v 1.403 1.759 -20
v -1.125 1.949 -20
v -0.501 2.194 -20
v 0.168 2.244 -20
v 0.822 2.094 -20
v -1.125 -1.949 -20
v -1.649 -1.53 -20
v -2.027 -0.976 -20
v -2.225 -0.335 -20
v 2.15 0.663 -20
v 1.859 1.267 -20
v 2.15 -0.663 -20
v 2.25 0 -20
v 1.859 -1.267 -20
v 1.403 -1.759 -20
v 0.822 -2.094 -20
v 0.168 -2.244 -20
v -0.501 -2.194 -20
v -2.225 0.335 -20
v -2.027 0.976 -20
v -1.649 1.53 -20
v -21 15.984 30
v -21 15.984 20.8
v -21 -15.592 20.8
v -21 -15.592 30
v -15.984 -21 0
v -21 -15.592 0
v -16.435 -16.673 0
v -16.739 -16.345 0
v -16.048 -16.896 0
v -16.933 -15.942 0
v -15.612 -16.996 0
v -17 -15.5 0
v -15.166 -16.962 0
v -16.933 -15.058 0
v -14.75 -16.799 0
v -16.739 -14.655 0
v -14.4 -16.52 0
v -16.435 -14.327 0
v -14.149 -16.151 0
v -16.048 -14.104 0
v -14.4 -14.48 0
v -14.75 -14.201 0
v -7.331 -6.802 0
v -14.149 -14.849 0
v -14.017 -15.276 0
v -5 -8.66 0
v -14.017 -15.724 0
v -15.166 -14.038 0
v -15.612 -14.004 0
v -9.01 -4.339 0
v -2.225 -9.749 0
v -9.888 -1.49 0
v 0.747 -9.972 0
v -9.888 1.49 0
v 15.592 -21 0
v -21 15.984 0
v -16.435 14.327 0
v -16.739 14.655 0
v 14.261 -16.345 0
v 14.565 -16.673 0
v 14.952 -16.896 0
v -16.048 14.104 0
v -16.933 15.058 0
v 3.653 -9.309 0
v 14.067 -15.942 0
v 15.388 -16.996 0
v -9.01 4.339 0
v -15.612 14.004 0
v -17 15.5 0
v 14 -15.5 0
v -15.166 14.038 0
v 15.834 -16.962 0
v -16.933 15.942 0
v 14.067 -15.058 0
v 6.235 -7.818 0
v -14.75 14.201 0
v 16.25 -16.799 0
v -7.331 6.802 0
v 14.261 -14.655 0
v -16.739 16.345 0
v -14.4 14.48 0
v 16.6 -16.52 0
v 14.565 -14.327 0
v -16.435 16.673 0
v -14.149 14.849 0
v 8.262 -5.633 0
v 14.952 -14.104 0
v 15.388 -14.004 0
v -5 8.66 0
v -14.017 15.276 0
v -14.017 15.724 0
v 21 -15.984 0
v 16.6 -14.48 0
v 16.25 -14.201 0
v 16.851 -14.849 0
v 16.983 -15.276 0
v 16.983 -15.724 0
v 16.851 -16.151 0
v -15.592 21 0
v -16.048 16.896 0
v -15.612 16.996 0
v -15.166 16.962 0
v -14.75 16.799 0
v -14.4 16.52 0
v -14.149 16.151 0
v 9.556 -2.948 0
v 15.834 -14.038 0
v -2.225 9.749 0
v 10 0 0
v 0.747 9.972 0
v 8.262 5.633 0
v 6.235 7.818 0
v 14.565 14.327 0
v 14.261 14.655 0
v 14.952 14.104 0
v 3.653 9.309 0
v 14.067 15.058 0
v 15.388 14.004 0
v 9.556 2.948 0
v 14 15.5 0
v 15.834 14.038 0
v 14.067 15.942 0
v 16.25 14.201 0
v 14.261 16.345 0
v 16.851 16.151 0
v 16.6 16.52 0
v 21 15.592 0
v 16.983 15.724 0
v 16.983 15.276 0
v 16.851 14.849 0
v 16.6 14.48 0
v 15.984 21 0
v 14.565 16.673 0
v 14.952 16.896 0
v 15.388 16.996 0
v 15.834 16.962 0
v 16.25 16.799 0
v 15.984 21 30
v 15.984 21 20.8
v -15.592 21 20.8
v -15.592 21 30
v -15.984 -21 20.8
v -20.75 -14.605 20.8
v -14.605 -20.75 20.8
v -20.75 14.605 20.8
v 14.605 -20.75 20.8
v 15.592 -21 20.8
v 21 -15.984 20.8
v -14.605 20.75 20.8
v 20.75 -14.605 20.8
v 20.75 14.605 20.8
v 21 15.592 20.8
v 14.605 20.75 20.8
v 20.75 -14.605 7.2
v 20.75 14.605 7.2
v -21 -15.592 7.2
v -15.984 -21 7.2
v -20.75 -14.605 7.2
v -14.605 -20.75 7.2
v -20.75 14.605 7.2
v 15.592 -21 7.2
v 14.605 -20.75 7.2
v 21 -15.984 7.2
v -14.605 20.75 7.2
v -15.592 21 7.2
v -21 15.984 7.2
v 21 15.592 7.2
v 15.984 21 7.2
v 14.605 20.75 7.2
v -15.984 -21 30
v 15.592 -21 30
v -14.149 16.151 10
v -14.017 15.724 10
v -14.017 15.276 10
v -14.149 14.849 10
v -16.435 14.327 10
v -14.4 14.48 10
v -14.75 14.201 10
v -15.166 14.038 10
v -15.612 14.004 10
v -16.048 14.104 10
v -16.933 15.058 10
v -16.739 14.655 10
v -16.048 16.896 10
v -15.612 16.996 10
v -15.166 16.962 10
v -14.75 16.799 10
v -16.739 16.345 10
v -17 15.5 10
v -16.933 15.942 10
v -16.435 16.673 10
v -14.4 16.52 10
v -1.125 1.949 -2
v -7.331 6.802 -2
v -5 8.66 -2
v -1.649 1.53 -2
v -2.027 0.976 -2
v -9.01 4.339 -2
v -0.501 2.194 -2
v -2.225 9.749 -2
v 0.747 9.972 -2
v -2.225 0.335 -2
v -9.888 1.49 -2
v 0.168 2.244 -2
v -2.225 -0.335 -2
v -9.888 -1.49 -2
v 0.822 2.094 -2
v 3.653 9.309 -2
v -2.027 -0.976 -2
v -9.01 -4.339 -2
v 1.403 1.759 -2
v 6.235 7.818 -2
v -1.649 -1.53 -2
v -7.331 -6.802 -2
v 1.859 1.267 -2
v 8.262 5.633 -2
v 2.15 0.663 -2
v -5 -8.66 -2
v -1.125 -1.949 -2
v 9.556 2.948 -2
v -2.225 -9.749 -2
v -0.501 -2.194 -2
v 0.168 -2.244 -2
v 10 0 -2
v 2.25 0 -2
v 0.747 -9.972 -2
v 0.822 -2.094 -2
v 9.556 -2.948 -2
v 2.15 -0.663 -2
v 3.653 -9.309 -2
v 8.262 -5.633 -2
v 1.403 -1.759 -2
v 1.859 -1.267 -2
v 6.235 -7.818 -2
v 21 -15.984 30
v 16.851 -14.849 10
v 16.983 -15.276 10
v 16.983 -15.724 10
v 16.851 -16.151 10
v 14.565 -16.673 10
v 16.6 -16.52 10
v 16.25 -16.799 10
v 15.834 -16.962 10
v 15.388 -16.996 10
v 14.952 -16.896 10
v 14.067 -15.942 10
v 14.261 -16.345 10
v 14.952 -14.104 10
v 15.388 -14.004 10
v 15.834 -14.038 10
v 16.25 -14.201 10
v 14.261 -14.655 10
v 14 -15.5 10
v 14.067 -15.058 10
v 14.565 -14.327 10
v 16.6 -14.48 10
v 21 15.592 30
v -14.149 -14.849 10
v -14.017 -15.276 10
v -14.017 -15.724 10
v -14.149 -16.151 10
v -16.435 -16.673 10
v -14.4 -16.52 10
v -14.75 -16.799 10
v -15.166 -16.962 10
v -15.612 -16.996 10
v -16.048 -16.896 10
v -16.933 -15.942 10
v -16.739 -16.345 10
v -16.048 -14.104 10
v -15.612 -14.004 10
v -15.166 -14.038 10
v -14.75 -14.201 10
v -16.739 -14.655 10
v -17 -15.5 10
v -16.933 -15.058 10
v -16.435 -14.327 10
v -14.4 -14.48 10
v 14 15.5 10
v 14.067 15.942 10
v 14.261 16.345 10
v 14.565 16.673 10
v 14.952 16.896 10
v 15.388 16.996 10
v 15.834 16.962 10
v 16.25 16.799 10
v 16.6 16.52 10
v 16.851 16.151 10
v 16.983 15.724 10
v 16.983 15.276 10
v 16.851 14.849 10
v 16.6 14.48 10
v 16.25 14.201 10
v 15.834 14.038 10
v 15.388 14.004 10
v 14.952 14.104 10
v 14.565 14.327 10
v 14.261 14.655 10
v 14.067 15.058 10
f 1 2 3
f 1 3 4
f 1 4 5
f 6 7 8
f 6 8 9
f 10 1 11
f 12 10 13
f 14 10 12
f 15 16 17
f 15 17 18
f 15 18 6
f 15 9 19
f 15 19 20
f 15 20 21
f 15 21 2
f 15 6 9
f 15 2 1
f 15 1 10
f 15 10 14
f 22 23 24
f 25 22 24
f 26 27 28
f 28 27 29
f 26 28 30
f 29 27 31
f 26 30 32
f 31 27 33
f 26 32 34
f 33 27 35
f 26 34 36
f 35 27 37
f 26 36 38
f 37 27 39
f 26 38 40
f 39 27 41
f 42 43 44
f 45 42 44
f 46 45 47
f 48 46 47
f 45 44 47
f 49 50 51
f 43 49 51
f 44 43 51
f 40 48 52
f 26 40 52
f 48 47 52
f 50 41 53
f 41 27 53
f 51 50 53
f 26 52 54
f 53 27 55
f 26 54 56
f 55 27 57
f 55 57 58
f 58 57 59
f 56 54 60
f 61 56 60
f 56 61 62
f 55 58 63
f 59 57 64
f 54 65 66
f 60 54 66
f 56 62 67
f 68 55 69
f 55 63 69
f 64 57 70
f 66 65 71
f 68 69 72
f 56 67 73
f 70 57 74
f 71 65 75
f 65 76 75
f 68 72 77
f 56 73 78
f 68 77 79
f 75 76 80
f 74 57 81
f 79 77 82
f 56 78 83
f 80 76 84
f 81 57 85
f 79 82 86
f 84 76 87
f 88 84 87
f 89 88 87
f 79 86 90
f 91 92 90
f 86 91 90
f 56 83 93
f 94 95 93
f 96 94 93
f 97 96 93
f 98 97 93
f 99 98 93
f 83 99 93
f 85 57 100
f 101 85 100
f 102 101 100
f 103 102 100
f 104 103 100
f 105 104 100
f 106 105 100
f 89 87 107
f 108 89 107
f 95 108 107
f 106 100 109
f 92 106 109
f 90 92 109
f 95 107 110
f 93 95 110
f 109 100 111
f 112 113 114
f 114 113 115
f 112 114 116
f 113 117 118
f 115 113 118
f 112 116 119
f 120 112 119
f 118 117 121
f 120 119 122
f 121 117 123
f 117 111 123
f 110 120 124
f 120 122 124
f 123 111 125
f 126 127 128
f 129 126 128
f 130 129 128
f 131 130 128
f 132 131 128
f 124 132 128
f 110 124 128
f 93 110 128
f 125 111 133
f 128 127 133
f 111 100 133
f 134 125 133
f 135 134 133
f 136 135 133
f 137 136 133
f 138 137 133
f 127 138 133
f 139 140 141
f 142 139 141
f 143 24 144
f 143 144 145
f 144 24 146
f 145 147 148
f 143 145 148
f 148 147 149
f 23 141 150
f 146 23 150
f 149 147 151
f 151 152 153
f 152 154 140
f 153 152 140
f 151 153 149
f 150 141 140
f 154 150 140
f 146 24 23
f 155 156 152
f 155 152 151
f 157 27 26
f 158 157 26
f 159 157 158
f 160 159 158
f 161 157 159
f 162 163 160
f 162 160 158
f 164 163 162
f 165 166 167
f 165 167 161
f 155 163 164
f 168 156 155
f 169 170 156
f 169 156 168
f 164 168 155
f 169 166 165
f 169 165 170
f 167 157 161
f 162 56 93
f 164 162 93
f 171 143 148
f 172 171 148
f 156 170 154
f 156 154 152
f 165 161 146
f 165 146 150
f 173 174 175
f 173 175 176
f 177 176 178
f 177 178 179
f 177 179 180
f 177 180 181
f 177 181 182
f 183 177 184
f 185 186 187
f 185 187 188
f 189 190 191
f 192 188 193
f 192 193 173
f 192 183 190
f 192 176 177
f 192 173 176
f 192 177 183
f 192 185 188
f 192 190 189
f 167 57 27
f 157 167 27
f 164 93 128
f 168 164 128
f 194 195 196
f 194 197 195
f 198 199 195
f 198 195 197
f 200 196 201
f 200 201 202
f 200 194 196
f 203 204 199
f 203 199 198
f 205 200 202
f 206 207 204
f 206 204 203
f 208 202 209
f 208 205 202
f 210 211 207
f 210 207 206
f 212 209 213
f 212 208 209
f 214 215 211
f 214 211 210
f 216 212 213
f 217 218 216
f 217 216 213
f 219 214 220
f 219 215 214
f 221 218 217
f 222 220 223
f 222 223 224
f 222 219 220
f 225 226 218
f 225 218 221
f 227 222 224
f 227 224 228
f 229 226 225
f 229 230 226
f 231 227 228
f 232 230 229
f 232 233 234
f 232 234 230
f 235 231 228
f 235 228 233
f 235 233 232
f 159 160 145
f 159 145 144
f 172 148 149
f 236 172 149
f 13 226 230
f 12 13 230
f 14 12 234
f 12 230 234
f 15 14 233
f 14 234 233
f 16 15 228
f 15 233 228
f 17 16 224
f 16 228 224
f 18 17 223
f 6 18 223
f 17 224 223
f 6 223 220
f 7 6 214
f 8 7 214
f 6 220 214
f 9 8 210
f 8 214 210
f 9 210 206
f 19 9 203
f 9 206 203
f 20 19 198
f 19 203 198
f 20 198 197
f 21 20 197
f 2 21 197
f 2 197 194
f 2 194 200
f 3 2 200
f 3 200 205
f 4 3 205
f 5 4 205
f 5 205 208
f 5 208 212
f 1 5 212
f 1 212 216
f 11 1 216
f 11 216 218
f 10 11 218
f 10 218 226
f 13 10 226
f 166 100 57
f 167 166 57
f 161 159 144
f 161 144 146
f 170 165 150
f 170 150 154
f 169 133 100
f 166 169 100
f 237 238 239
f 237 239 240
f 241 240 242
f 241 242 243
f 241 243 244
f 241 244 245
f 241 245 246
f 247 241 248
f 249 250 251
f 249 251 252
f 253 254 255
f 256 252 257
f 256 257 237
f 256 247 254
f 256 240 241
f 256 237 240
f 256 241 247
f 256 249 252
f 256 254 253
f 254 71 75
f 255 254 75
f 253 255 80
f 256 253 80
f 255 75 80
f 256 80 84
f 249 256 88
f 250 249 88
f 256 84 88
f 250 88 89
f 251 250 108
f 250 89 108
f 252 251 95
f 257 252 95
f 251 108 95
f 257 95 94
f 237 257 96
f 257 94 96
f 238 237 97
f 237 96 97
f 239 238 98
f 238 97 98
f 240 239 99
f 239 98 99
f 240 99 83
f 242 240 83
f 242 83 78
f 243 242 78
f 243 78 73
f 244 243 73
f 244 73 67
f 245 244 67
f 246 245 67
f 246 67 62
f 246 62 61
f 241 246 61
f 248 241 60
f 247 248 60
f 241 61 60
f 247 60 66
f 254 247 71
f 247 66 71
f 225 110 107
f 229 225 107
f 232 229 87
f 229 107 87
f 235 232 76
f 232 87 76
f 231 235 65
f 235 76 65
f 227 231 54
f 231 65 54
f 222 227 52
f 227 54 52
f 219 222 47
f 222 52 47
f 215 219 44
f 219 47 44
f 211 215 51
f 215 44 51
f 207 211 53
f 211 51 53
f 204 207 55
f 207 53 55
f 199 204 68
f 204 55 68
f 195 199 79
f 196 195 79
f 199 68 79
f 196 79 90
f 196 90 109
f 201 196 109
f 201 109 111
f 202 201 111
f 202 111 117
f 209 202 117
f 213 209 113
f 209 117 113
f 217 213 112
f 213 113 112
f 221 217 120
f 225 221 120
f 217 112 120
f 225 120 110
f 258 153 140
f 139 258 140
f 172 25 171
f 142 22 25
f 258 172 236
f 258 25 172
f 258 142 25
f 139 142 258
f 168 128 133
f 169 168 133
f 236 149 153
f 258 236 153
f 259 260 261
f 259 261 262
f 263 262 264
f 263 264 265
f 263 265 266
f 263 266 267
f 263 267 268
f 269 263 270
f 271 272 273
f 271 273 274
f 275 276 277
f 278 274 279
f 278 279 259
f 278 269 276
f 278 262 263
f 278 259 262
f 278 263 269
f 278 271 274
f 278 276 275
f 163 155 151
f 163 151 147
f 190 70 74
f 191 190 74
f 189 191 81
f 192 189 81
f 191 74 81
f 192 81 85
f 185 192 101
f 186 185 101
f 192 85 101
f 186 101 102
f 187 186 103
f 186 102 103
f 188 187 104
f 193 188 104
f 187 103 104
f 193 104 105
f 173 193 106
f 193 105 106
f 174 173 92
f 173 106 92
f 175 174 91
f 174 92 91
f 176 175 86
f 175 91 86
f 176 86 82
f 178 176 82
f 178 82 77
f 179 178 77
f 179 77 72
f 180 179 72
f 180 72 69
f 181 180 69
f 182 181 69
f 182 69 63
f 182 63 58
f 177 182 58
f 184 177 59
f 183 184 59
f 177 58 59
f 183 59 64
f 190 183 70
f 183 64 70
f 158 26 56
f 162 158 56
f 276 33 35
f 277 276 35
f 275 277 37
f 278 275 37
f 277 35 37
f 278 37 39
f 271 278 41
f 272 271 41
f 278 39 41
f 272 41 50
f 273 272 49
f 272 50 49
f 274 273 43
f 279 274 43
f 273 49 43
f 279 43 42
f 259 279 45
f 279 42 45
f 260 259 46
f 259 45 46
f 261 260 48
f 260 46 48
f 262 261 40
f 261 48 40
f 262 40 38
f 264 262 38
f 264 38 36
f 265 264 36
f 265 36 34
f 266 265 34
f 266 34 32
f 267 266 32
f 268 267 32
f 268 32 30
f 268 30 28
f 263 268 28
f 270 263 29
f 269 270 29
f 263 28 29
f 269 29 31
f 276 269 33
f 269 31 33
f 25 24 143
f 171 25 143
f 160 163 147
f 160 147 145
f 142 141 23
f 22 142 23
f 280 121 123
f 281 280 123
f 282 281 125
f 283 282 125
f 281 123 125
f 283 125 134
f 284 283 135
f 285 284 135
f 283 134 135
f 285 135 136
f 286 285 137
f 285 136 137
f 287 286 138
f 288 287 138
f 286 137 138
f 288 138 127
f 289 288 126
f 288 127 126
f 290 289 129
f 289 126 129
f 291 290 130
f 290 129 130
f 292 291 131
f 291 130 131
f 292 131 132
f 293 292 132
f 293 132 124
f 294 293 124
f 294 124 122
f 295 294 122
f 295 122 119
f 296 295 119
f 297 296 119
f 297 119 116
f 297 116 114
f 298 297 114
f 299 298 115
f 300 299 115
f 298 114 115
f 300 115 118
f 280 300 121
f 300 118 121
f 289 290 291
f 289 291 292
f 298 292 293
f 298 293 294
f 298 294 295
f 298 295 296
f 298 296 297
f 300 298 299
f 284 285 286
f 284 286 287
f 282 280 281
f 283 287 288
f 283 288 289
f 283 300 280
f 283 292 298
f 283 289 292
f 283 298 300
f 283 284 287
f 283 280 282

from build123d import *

# Parameters (mm, degrees)
RESSALTO_EXTRUS_O1_DEPTH   = 30
CORTE_EXTRUS_O_FINA1_START = -22.8
CORTE_EXTRUS_O_FINA1_DEPTH = 13.6
ESBO_O3_R                  = 2.25
RESSALTO_EXTRUS_O2_DEPTH   = 20
ESBO_O4_R                  = 10
RESSALTO_EXTRUS_O3_DEPTH   = 2
ESBO_O5_R                  = 1.5
CORTE_EXTRUS_O1_DEPTH      = 10


# Read off the part's stored shape, not the designer's step: Corte-Extrusão-Fina1
with BuildPart() as part:
    # Esboço1 → Ressalto-extrusão1 (new body)
    with BuildSketch(Plane.XY):
        Polygon((-21, -15.592171873), (-15.984175996, -21), (15.592171873, -21), (21, -15.984175996), (21, 15.592171873), (15.984175996, 21), (-15.592171873, 21), (-21, 15.984175996), align=None)
    extrude(amount=RESSALTO_EXTRUS_O1_DEPTH)

    # Corte-Extrusão-Fina1 outline → Corte-Extrusão-Fina1 (cut)
    with BuildSketch(Plane.XY.offset(30).offset(CORTE_EXTRUS_O_FINA1_START)):
        Polygon((15.592171873, -21), (21, -15.984175996), (21, 15.592171873), (15.984175996, 21), (-15.592171873, 21), (-21, 15.984175996), (-21, -15.592171873), (-15.984175996, -21), align=None)
        Polygon((14.605339059, 20.75), (20.75, 14.605339059), (20.75, -14.605339059), (14.605339059, -20.75), (-14.605339059, -20.75), (-20.75, -14.605339059), (-20.75, 14.605339059), (-14.605339059, 20.75), align=None, mode=Mode.SUBTRACT)
    extrude(amount=CORTE_EXTRUS_O_FINA1_DEPTH, mode=Mode.SUBTRACT)

    # Esboço3 → Ressalto-extrusão2 (add)
    with BuildSketch(Plane(origin=(0, 0, 0), x_dir=(-1, 0, 0), z_dir=(0, 0, -1))):
        with Locations(Location((0, 0, 0), (0, 0, 180))):
            Circle(ESBO_O3_R)
    extrude(amount=RESSALTO_EXTRUS_O2_DEPTH)

    # Esboço4 → Ressalto-extrusão3 (add)
    with BuildSketch(Plane(origin=(0, 0, 0), x_dir=(-1, 0, 0), z_dir=(0, 0, -1))):
        with Locations(Location((0, 0, 0), (0, 0, 180))):
            Circle(ESBO_O4_R)
    extrude(amount=RESSALTO_EXTRUS_O3_DEPTH)

    # Esboço5 → Corte-extrusão1 (cut)
    with BuildSketch(Plane(origin=(0, 0, 0), x_dir=(-1, 0, 0), z_dir=(0, 0, -1))):
        with Locations((15.5, -15.5)):
            Circle(ESBO_O5_R)
        with Locations((-15.5, -15.5)):
            Circle(ESBO_O5_R)
        with Locations((-15.5, 15.5)):
            Circle(ESBO_O5_R)
        with Locations((15.5, 15.5)):
            Circle(ESBO_O5_R)
    extrude(amount=-CORTE_EXTRUS_O1_DEPTH, mode=Mode.SUBTRACT)


solid = part.part
